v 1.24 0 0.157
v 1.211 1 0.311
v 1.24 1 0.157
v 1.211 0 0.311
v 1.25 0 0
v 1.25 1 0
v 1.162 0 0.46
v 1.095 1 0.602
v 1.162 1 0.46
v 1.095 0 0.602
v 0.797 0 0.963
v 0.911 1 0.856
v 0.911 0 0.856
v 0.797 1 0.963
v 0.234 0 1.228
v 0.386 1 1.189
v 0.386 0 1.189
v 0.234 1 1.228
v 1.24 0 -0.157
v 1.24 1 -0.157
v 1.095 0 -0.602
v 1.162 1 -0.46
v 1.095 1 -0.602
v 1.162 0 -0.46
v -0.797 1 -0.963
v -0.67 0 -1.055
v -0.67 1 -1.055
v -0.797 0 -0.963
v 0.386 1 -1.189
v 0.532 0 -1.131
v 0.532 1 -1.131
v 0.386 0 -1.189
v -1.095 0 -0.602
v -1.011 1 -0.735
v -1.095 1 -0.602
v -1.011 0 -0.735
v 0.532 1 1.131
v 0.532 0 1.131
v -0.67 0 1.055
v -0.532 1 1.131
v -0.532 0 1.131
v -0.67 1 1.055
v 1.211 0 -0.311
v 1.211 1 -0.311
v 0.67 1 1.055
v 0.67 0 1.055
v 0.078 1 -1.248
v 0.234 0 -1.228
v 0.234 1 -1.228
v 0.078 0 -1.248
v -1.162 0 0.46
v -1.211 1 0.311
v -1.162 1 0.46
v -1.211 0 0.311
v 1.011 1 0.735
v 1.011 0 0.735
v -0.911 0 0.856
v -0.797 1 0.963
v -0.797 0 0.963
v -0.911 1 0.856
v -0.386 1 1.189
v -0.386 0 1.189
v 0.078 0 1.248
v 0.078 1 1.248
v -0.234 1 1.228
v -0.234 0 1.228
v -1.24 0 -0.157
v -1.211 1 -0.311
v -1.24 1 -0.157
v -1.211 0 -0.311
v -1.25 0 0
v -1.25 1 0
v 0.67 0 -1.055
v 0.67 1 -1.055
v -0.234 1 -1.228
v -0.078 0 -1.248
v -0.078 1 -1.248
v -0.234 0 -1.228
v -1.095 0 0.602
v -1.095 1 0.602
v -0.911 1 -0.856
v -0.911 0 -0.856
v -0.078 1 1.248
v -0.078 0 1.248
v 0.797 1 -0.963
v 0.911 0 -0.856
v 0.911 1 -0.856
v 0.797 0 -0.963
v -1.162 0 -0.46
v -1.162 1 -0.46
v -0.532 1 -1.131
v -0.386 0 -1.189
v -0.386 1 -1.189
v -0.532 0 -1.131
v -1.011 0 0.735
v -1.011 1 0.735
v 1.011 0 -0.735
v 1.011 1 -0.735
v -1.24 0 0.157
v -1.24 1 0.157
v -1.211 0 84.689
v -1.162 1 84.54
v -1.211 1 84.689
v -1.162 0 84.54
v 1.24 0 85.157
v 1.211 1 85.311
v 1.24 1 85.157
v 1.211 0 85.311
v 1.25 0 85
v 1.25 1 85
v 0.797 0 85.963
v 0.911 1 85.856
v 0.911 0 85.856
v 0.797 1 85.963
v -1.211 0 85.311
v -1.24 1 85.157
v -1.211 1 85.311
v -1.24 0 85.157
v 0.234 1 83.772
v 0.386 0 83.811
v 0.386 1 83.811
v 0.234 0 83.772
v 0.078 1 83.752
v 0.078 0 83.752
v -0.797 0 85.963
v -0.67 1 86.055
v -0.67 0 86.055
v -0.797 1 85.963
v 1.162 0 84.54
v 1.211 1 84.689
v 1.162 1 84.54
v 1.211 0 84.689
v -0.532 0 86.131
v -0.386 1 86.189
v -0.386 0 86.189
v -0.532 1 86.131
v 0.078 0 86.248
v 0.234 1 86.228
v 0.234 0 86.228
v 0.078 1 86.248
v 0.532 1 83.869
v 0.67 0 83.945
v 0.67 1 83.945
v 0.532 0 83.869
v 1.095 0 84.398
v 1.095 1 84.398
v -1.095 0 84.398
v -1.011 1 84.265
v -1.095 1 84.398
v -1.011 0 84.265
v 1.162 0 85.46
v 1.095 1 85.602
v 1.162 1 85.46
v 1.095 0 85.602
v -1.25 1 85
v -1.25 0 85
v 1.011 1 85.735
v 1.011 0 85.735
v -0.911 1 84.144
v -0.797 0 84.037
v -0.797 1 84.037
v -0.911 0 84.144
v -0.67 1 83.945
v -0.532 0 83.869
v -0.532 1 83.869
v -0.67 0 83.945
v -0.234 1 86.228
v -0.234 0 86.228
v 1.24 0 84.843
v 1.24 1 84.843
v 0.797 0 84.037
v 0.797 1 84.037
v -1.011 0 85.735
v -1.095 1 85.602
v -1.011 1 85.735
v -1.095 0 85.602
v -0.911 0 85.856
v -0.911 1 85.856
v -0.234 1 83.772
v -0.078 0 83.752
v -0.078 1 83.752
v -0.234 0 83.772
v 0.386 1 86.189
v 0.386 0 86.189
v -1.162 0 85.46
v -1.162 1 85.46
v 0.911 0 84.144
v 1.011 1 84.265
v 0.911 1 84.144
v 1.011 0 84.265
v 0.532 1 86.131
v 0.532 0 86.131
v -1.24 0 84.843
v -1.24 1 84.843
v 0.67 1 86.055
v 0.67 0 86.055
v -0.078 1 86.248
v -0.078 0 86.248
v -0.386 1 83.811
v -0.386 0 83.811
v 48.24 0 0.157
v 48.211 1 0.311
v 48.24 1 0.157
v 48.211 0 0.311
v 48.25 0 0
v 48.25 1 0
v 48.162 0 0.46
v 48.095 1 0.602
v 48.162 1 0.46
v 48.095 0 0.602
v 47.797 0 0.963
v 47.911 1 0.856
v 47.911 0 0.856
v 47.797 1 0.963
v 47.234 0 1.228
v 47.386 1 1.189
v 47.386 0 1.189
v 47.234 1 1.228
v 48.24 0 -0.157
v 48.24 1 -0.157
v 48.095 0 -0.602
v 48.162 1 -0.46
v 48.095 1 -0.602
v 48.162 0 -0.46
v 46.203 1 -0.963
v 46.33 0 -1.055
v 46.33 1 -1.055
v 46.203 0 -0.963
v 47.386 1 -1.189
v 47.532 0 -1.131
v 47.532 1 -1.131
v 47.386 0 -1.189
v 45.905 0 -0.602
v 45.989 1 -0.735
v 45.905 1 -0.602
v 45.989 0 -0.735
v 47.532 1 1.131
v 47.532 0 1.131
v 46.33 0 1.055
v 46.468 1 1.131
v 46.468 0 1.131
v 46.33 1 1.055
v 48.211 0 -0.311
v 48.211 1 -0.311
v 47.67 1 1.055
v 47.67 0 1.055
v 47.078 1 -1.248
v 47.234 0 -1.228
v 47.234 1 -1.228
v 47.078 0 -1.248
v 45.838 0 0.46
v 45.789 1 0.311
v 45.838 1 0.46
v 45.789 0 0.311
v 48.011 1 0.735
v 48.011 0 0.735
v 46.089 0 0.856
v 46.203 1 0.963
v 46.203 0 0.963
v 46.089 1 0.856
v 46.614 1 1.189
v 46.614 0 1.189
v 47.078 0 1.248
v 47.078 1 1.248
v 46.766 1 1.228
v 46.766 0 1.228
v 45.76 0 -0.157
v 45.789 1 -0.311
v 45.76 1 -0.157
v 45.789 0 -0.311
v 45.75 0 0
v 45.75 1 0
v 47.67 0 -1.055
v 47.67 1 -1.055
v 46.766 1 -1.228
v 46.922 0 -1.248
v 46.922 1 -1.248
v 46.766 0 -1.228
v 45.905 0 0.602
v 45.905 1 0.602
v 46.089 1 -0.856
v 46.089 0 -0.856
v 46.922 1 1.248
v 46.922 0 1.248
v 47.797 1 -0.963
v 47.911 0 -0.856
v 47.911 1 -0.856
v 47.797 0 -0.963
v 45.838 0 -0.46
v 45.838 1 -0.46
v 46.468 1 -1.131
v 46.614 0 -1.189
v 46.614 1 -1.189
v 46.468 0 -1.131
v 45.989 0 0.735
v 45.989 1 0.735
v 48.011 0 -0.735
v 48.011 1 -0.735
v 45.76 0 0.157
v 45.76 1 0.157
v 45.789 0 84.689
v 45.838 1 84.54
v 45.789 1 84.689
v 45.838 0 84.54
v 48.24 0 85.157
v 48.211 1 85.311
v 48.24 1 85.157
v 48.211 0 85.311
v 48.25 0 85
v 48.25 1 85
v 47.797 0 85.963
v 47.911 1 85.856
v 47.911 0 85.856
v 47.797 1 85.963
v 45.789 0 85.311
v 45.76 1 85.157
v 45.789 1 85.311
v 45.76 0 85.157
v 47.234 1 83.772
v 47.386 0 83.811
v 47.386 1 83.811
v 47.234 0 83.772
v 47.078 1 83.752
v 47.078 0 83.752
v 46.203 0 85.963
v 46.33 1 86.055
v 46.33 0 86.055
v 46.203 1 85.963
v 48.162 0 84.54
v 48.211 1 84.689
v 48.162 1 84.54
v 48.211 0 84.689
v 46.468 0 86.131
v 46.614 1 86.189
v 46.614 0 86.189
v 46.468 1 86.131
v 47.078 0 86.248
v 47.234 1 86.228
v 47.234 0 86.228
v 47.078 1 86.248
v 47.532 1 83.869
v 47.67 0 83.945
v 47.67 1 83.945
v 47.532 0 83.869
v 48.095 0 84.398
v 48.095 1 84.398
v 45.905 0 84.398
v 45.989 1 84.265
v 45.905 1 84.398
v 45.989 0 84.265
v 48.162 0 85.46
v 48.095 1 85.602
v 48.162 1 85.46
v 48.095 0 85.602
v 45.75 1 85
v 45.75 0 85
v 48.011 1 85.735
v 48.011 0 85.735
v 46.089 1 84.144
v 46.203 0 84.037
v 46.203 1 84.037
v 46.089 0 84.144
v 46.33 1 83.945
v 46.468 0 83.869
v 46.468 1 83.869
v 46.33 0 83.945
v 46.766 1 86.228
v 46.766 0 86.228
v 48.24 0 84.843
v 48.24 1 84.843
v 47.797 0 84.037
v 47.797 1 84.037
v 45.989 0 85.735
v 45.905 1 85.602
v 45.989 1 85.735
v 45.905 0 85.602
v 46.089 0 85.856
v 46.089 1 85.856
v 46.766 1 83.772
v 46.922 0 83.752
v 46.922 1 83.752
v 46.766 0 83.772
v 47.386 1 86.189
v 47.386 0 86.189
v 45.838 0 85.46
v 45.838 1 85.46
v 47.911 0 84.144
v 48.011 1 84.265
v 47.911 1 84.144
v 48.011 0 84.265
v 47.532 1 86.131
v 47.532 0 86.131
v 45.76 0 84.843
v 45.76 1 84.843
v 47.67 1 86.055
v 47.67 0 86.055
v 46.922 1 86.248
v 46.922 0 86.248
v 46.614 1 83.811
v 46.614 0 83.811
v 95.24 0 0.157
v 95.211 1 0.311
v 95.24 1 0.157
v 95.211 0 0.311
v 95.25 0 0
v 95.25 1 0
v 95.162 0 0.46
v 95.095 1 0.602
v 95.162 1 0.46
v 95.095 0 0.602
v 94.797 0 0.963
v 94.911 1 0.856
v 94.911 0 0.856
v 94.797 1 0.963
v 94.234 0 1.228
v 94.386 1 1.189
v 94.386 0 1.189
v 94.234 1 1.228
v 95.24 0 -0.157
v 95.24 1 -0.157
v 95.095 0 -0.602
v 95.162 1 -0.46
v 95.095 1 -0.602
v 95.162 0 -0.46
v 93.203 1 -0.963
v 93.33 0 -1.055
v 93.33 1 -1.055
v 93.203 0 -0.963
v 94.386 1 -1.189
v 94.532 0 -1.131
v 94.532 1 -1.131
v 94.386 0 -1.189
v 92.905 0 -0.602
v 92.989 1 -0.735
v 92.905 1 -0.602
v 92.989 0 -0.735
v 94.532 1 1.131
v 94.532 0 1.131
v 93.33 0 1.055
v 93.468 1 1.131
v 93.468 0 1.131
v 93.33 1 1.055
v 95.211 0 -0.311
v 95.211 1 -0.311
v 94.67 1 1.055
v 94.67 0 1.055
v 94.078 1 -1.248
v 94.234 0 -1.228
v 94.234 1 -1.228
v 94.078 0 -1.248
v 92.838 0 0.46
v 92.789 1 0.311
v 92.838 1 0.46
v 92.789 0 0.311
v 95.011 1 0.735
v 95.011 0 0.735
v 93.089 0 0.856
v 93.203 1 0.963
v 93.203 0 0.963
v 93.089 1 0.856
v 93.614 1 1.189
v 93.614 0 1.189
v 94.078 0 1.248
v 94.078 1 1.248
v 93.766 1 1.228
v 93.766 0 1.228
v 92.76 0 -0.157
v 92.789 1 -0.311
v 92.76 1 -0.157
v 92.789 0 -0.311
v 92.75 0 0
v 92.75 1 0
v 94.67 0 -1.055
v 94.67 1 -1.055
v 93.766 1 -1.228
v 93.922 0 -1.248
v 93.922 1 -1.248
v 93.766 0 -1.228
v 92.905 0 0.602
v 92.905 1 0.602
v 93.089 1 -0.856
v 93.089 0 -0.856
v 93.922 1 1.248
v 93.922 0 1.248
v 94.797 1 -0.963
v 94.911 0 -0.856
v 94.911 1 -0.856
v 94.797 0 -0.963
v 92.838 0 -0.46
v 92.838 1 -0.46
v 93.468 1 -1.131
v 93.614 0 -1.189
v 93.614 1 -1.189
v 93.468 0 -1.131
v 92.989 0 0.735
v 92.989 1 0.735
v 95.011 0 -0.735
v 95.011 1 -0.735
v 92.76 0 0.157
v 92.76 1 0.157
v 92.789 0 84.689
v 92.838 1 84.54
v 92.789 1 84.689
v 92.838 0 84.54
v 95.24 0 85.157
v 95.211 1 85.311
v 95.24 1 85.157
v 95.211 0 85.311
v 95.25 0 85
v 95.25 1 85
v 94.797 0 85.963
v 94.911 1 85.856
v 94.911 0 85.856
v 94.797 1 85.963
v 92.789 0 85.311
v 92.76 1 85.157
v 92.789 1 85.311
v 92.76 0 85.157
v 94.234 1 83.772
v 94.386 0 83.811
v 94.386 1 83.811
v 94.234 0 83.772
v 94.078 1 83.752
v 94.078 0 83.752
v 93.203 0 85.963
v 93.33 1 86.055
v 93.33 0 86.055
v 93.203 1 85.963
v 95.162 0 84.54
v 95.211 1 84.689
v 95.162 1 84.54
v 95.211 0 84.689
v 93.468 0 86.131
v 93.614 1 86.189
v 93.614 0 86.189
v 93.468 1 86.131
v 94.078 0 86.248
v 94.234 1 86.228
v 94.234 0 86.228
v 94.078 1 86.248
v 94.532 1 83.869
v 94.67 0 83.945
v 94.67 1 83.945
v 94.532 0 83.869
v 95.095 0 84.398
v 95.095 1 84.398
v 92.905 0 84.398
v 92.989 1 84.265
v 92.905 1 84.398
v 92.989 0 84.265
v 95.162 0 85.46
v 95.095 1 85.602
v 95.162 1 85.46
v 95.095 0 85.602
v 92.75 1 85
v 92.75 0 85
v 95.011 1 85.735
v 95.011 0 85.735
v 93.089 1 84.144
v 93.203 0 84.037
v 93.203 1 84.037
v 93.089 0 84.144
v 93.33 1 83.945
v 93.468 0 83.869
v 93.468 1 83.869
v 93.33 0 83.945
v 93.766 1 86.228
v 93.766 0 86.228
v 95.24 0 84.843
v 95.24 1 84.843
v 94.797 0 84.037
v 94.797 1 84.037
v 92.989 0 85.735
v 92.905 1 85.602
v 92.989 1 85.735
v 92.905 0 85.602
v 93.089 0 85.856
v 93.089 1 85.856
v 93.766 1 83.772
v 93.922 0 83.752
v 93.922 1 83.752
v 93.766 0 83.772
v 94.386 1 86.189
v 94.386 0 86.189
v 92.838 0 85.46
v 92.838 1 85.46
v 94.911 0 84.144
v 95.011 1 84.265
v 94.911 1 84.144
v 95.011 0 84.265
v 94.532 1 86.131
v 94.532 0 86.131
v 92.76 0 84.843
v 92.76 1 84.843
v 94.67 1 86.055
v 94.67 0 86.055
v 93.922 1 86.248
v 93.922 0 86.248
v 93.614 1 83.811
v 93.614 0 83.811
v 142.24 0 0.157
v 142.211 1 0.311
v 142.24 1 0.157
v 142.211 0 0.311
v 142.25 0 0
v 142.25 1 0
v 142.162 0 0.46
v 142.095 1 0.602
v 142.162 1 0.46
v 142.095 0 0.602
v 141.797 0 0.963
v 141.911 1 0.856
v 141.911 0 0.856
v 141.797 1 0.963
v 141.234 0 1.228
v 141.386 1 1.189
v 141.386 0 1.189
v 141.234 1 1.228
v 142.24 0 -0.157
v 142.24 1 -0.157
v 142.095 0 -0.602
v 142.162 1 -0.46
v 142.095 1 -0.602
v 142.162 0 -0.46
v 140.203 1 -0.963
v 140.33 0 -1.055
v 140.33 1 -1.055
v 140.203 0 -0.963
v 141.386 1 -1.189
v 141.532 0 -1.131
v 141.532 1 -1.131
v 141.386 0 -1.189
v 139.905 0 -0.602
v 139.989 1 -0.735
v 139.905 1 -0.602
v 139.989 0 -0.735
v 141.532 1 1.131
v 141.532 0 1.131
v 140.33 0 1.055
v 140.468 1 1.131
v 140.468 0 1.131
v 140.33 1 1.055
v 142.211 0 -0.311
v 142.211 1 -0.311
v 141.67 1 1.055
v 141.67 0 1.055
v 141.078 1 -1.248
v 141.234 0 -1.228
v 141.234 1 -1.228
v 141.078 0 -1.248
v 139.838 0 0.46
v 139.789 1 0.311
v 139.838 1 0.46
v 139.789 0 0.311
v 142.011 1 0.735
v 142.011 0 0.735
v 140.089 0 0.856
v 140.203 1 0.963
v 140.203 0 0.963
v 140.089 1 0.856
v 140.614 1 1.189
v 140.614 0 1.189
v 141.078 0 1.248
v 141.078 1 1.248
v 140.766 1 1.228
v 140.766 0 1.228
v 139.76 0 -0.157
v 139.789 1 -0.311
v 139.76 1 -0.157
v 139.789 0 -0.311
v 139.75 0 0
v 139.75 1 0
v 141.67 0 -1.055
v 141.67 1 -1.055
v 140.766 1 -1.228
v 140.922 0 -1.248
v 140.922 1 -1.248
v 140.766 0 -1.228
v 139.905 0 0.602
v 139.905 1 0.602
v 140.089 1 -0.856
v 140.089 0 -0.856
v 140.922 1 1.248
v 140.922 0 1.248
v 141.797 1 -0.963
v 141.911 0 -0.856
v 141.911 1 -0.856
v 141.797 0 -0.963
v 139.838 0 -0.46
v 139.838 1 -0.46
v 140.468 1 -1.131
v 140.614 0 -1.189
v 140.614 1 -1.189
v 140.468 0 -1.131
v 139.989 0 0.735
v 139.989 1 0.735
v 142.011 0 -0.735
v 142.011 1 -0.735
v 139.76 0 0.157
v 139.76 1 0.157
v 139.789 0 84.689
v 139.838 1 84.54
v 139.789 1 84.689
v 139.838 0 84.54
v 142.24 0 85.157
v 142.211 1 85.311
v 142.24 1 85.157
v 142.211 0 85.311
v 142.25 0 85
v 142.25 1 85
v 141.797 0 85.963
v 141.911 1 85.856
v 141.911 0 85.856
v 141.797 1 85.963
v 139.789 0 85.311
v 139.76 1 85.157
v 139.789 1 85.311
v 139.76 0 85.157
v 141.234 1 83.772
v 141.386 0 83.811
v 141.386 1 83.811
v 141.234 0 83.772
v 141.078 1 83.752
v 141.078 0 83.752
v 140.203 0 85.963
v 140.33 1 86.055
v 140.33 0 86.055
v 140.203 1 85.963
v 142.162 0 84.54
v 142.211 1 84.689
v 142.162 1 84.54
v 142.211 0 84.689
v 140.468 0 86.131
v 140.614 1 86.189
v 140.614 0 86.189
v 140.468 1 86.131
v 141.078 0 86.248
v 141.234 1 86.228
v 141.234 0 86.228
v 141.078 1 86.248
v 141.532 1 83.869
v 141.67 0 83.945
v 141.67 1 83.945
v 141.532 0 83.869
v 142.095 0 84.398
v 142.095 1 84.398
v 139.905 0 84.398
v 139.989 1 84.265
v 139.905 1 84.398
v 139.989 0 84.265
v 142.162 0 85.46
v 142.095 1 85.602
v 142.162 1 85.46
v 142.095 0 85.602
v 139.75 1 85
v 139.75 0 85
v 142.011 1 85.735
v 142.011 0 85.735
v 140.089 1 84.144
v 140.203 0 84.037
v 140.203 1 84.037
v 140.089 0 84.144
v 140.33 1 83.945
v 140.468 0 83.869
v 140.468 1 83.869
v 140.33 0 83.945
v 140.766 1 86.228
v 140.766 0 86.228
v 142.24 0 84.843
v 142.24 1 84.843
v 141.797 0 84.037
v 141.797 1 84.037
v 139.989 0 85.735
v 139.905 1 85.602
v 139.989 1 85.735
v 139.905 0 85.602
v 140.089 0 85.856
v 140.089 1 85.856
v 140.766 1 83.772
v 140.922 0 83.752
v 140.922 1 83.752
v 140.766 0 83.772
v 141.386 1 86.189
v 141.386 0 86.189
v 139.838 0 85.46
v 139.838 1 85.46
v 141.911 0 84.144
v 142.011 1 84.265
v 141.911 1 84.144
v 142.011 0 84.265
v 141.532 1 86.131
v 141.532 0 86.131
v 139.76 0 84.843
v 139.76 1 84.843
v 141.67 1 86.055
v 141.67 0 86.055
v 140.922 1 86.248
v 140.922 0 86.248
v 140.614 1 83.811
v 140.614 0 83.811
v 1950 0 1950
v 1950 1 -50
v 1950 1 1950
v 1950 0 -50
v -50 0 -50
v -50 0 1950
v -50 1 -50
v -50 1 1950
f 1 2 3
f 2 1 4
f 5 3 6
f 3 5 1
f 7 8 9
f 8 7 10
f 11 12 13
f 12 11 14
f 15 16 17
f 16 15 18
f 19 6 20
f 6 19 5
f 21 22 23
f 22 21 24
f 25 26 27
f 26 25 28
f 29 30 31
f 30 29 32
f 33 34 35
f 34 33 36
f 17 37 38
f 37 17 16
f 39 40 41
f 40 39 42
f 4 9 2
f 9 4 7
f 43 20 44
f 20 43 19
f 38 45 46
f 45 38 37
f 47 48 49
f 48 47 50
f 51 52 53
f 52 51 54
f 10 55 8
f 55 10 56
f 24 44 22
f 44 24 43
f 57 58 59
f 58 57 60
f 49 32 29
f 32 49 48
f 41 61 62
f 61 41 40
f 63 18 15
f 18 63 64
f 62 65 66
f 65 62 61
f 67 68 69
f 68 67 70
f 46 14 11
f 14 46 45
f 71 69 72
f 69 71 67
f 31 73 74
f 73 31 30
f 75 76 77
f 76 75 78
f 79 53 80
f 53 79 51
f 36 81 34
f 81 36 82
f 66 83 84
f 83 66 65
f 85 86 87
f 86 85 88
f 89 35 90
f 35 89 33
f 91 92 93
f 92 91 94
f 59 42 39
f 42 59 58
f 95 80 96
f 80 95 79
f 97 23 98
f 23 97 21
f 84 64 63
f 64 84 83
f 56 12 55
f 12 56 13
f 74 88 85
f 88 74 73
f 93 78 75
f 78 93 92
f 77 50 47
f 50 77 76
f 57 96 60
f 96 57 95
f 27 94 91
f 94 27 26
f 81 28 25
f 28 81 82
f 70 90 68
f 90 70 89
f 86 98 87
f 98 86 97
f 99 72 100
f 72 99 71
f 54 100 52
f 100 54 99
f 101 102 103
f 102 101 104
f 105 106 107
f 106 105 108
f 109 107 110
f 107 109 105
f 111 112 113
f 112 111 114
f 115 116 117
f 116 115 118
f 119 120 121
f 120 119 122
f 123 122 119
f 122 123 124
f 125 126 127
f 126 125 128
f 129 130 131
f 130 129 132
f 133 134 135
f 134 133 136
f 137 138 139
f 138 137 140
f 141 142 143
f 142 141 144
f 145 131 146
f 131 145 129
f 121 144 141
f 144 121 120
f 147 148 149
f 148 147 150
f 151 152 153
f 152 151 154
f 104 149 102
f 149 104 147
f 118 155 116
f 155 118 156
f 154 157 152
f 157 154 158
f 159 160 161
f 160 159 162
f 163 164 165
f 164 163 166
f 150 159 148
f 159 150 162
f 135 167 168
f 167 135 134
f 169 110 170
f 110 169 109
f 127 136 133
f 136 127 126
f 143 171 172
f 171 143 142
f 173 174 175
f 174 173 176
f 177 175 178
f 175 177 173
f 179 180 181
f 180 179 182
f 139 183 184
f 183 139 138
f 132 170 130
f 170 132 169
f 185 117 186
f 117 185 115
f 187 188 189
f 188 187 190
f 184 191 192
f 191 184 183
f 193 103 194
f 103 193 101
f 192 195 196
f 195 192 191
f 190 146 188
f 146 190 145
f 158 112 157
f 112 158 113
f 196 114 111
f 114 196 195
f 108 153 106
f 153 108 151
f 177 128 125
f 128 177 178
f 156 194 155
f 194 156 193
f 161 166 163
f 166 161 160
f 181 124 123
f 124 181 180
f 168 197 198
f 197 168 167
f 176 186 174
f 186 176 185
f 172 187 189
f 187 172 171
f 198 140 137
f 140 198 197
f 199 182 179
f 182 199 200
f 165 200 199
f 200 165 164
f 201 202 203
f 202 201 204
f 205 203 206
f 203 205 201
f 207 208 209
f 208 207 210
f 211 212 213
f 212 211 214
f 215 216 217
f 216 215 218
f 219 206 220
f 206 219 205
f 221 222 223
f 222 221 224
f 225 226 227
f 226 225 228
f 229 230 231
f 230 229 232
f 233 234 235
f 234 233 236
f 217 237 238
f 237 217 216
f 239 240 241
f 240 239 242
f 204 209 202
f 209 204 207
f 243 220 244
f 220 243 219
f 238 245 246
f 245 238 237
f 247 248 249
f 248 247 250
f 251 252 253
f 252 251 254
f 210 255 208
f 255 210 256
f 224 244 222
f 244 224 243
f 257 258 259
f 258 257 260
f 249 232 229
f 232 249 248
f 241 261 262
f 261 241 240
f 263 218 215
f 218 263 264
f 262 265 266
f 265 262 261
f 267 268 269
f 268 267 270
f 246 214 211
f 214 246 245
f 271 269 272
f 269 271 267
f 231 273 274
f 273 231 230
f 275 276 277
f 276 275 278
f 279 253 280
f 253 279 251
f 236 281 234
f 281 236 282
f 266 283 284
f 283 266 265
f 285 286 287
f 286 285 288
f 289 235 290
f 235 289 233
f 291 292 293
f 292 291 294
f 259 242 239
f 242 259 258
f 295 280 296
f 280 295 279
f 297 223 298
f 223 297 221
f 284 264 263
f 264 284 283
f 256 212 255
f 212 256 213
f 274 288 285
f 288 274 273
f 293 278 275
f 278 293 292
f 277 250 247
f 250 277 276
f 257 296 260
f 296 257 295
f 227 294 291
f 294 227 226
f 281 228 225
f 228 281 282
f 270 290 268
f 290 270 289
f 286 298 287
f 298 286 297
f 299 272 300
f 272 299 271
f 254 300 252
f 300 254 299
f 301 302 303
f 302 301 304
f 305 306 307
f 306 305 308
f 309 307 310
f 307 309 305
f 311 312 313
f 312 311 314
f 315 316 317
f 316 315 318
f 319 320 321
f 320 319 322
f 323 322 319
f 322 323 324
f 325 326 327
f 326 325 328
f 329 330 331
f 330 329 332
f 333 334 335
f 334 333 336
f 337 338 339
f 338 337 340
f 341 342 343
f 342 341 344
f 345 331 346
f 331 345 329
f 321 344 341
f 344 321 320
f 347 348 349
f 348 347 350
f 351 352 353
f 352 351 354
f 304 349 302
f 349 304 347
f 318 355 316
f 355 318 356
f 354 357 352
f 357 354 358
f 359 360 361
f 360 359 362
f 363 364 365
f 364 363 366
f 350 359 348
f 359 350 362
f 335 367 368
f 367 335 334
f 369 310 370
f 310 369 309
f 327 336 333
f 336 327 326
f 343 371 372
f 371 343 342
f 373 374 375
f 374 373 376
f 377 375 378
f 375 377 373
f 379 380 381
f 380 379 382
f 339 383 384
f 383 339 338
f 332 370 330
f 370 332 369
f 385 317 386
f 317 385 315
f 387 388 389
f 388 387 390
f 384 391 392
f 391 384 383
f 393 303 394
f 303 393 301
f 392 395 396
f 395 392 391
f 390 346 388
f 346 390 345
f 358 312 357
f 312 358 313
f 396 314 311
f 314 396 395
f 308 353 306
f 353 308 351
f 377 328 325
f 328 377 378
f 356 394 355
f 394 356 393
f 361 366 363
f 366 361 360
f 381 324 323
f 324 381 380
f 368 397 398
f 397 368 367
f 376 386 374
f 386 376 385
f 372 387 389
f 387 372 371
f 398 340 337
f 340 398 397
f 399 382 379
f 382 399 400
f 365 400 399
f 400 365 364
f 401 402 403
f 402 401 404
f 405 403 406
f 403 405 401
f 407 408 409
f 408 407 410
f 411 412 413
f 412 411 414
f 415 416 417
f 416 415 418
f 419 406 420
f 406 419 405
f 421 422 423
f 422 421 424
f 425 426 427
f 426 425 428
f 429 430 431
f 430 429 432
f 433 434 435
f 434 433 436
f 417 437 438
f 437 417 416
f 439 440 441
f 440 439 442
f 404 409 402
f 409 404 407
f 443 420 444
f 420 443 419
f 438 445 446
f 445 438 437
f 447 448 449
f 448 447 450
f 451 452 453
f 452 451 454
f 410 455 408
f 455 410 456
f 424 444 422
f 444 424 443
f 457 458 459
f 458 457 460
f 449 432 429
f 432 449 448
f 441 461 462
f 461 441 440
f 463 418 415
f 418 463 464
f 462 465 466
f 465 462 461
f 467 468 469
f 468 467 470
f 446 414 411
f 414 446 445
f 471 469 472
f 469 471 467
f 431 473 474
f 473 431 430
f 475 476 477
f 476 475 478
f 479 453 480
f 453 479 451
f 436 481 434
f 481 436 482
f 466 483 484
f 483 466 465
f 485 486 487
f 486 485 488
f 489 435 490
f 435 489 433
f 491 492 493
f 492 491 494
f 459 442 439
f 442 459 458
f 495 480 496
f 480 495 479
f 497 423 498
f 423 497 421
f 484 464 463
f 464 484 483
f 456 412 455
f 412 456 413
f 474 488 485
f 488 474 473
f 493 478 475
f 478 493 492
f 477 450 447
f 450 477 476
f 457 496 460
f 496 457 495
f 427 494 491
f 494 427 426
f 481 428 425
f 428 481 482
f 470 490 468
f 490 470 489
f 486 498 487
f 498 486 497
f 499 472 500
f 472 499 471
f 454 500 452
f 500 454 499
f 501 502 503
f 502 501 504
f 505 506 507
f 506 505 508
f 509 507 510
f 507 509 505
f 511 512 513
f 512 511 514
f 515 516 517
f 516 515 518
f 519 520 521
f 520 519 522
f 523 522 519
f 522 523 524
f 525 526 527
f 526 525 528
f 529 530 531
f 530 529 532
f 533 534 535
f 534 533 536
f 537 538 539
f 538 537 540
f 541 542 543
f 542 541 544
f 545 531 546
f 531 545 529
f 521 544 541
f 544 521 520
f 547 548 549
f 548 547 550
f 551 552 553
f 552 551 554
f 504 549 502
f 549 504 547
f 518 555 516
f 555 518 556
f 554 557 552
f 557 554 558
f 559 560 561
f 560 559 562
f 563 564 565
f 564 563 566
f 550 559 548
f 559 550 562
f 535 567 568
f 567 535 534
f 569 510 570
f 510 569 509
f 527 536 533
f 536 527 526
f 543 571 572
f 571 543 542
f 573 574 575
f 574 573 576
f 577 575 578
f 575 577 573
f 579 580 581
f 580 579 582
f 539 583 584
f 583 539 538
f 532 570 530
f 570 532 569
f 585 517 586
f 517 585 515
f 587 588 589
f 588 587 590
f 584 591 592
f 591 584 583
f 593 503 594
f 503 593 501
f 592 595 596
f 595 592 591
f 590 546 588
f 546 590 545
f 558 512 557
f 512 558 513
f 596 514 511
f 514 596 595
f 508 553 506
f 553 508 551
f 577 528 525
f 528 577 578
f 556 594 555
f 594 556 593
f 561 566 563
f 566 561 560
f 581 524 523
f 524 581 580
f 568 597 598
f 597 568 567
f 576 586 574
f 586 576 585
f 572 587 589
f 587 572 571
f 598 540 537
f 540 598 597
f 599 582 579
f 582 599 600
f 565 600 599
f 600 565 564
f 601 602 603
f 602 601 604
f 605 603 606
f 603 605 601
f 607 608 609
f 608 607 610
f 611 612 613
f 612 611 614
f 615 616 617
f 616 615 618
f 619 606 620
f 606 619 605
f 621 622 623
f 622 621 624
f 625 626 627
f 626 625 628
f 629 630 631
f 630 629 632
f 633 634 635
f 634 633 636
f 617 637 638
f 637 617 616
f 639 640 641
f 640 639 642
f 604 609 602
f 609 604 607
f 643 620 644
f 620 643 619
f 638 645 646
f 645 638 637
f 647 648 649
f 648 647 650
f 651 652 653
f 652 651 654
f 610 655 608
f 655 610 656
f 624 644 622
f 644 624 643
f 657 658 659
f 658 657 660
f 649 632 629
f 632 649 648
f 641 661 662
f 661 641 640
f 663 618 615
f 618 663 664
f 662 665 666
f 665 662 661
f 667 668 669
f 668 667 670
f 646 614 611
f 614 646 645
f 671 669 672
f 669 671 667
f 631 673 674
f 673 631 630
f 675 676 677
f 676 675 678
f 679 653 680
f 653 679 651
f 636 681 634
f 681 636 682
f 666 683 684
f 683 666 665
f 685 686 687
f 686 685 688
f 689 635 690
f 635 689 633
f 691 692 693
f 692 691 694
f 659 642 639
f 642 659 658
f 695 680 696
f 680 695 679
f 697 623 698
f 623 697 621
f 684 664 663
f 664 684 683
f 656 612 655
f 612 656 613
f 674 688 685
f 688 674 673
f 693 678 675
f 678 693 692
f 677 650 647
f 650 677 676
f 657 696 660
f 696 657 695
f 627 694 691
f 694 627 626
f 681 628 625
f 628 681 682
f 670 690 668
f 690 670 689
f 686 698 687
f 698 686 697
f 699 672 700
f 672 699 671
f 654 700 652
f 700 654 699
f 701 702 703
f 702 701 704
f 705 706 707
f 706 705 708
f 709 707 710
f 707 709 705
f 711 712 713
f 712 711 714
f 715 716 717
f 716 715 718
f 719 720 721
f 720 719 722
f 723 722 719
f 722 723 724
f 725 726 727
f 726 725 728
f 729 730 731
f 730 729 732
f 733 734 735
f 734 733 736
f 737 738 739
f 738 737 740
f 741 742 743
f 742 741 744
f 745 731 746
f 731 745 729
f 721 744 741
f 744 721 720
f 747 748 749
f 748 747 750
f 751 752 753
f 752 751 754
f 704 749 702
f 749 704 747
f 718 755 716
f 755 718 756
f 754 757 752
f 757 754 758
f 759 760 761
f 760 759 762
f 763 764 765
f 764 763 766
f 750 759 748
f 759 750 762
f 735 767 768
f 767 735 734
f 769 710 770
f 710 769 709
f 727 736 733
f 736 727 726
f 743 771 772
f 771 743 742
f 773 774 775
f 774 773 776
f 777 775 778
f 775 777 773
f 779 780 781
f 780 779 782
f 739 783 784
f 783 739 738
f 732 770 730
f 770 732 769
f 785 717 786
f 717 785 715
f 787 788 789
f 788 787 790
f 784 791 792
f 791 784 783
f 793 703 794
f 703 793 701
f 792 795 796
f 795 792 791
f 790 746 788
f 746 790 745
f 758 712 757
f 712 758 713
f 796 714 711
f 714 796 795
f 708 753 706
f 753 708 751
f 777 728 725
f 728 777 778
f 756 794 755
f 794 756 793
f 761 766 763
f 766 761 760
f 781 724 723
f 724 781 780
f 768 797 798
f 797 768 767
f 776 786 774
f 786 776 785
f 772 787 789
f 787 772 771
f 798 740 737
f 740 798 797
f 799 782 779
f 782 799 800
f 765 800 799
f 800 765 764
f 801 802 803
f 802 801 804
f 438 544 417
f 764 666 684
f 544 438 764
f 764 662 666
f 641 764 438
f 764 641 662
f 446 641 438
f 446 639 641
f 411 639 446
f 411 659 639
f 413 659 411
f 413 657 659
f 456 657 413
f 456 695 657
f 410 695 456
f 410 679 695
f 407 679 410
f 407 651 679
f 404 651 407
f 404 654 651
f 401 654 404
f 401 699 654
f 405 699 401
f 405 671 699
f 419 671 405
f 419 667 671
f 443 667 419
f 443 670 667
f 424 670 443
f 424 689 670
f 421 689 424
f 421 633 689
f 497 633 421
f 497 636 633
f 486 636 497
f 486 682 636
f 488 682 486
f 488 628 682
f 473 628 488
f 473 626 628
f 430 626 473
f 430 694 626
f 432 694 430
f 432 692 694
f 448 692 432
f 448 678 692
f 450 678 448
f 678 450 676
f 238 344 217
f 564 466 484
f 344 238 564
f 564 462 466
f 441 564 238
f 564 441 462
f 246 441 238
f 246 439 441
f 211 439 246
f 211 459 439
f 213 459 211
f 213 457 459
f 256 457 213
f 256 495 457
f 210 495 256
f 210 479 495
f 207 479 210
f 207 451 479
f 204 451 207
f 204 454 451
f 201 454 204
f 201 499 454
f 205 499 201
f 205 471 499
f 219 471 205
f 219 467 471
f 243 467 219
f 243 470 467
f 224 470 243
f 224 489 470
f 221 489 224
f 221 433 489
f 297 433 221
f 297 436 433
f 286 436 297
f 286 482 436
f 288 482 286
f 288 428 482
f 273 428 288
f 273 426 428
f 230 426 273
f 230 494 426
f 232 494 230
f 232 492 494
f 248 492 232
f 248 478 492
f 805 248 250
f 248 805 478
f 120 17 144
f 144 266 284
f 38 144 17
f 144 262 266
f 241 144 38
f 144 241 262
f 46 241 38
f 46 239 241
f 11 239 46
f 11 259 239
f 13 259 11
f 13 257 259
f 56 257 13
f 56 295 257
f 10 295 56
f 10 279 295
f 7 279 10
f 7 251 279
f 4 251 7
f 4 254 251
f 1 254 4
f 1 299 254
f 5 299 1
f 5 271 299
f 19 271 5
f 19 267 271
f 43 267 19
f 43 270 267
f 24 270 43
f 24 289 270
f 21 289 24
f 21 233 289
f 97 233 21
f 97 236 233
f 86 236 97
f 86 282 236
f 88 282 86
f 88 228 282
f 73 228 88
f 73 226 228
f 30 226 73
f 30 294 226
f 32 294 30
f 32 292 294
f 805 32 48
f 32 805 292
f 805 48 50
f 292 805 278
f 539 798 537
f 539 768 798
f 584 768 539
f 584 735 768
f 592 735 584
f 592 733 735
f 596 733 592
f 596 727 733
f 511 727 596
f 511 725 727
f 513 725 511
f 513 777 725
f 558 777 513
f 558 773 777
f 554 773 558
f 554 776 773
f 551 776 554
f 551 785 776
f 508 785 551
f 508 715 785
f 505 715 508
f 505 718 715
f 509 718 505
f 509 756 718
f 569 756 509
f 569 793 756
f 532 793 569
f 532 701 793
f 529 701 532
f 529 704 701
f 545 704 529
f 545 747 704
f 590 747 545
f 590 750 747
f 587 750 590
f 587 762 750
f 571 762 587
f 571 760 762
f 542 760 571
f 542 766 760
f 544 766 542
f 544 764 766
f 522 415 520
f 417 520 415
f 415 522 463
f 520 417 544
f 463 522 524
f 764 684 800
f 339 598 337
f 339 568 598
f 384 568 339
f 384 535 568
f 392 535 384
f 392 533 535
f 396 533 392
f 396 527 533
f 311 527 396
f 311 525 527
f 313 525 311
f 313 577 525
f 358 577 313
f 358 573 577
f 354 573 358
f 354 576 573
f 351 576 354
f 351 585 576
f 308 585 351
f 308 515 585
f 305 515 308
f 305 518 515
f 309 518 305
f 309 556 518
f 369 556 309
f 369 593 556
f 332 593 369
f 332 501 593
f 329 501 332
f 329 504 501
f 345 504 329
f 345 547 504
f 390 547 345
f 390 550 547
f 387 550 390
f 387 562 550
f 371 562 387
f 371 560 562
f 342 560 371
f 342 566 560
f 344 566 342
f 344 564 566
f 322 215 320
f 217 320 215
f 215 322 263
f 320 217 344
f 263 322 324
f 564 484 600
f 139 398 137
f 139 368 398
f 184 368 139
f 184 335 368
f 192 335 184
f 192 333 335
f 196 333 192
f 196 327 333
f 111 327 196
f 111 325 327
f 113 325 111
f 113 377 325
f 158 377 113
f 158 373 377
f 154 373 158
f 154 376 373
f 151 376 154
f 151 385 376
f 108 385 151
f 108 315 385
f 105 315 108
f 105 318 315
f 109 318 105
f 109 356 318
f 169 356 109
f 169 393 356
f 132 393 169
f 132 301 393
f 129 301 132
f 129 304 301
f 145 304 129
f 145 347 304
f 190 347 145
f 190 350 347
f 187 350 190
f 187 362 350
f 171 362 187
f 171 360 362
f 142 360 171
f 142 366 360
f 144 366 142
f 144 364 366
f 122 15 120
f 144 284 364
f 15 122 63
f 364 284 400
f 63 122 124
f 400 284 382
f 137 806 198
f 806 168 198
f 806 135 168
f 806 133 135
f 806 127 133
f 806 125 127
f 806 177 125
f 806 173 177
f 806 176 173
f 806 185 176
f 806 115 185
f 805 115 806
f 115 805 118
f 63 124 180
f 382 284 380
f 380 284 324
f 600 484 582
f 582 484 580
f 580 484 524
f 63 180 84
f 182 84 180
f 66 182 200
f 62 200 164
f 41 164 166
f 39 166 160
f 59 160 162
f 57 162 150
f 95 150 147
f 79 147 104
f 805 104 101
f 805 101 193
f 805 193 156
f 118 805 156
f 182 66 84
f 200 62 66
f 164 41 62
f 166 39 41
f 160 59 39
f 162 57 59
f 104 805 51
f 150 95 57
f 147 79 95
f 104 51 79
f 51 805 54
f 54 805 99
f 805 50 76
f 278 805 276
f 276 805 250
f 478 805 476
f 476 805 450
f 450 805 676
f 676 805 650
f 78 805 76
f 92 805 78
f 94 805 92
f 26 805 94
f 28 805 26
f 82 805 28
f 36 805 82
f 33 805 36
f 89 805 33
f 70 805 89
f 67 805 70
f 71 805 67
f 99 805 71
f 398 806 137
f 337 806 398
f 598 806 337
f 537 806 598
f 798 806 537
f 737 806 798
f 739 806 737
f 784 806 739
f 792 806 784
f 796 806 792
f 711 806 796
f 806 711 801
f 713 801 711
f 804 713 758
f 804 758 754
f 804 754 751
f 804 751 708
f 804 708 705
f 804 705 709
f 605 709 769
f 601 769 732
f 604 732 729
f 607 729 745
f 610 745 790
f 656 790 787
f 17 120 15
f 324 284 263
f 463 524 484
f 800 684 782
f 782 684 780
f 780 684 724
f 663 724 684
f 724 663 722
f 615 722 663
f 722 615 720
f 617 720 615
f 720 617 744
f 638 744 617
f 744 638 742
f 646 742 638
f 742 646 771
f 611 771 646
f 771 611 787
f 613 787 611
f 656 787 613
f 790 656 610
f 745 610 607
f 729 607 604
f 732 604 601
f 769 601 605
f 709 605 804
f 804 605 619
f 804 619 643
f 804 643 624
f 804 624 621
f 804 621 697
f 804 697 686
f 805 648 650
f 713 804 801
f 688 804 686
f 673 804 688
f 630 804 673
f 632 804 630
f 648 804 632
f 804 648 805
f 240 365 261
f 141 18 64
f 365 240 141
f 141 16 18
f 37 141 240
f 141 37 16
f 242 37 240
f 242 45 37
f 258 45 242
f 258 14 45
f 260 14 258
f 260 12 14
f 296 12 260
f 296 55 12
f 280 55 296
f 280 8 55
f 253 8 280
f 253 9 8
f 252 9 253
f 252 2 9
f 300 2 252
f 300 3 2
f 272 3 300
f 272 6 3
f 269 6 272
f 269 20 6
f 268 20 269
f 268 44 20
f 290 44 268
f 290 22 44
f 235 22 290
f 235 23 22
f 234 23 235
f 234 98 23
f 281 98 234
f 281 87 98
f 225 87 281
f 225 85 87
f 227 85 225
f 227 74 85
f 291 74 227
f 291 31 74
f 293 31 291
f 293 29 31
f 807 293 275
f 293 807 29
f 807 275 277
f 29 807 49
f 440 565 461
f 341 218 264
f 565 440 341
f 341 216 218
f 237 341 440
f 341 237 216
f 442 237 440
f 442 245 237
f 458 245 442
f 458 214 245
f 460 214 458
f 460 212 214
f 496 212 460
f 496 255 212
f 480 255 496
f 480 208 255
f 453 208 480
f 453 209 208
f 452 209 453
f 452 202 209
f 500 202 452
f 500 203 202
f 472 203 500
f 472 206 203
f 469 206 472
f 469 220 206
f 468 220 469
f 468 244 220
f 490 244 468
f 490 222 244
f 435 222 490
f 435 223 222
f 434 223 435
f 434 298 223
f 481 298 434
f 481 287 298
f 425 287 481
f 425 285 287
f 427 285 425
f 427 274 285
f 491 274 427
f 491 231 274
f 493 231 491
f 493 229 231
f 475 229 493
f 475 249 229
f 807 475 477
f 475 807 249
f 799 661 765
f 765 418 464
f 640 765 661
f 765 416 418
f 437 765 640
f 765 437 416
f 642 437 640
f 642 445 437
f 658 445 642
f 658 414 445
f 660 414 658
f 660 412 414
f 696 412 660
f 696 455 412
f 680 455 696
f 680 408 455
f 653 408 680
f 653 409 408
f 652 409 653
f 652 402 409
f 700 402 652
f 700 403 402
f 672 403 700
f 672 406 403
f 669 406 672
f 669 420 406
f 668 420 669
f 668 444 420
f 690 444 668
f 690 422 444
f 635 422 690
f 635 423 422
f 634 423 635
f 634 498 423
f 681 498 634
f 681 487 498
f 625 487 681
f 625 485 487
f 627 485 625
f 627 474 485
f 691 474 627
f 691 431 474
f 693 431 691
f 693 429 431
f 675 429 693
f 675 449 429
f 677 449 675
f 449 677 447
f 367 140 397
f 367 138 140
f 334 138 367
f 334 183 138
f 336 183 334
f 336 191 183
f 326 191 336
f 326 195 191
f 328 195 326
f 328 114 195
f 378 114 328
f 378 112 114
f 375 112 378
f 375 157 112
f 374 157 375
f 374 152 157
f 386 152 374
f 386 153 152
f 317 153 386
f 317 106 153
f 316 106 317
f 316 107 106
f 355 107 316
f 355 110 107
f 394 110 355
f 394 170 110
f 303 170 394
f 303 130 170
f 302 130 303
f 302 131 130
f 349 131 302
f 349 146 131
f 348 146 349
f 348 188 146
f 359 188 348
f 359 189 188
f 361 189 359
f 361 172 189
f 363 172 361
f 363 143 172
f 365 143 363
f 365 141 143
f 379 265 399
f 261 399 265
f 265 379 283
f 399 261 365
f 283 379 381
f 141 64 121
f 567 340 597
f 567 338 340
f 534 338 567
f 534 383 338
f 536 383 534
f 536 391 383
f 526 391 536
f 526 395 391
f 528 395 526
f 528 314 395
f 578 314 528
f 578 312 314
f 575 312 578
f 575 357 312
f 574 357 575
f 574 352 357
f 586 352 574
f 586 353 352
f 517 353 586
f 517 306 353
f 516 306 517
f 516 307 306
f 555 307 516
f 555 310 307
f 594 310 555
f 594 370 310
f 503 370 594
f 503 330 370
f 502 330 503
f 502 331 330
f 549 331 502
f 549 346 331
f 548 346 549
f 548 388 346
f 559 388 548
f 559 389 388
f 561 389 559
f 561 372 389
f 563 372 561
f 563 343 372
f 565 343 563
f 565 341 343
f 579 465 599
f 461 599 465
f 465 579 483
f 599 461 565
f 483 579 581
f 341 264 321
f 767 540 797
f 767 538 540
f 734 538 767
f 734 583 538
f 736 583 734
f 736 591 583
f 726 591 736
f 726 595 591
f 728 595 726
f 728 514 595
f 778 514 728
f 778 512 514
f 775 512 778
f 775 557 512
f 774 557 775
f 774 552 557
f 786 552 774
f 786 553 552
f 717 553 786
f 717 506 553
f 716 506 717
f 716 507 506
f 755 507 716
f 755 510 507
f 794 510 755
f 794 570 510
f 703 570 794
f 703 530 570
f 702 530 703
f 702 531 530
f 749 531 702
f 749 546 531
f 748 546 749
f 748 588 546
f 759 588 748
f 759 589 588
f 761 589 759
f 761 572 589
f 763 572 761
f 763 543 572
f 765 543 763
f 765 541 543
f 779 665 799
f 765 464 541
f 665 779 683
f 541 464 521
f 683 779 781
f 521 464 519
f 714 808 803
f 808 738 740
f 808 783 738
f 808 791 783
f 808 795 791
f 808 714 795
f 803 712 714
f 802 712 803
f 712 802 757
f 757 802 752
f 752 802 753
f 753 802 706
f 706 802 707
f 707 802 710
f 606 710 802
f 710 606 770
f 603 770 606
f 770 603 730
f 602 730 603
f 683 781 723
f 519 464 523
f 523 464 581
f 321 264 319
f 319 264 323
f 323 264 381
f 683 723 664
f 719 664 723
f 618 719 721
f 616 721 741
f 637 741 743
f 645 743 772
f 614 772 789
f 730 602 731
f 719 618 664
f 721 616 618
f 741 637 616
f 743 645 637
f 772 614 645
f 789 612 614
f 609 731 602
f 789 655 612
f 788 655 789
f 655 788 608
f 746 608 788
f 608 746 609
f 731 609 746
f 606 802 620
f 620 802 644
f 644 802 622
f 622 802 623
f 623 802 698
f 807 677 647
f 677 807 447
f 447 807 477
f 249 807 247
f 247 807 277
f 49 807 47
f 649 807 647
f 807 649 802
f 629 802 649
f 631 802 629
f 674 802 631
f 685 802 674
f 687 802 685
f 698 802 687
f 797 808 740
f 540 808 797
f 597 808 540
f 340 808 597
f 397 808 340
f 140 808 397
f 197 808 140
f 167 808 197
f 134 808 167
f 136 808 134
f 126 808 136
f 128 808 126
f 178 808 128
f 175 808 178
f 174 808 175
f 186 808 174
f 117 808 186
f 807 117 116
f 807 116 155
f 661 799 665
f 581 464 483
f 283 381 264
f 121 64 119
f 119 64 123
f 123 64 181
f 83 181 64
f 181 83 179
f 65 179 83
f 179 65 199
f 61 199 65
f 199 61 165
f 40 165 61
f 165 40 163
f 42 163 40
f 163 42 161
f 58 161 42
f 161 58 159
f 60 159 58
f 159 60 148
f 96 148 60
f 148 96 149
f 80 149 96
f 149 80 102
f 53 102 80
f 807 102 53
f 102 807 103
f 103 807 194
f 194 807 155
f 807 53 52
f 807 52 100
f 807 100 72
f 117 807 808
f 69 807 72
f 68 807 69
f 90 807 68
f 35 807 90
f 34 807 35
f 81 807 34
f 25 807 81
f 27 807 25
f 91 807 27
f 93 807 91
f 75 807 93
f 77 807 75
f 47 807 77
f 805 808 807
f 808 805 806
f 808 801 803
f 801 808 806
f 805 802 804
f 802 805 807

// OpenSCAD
module OutletMount(depth, height) {
  translate([0, 0, -depth]){
    cylinder(h=depth+0.1, r=1.25, $fn=50);
    translate([0, height, 0]) cylinder(h=depth+0.1, r=1.25, $fn=50);
  }
}

module OutletsMount(n_outlets, spacing, outlet_depth, outlet_height){
  for (x = [0:spacing:(n_outlets - 1) * spacing]){
    translate([x, 0, 0]) OutletMount(depth=outlet_depth, height=outlet_height);
  }
}

rotate([90, 0, 0]) difference(){
  translate([-50, -50, -1]) cube([2000, 2000, 1]);
  color("blue") OutletsMount(n_outlets=4, spacing=47, outlet_depth=2, outlet_height=85);
}
